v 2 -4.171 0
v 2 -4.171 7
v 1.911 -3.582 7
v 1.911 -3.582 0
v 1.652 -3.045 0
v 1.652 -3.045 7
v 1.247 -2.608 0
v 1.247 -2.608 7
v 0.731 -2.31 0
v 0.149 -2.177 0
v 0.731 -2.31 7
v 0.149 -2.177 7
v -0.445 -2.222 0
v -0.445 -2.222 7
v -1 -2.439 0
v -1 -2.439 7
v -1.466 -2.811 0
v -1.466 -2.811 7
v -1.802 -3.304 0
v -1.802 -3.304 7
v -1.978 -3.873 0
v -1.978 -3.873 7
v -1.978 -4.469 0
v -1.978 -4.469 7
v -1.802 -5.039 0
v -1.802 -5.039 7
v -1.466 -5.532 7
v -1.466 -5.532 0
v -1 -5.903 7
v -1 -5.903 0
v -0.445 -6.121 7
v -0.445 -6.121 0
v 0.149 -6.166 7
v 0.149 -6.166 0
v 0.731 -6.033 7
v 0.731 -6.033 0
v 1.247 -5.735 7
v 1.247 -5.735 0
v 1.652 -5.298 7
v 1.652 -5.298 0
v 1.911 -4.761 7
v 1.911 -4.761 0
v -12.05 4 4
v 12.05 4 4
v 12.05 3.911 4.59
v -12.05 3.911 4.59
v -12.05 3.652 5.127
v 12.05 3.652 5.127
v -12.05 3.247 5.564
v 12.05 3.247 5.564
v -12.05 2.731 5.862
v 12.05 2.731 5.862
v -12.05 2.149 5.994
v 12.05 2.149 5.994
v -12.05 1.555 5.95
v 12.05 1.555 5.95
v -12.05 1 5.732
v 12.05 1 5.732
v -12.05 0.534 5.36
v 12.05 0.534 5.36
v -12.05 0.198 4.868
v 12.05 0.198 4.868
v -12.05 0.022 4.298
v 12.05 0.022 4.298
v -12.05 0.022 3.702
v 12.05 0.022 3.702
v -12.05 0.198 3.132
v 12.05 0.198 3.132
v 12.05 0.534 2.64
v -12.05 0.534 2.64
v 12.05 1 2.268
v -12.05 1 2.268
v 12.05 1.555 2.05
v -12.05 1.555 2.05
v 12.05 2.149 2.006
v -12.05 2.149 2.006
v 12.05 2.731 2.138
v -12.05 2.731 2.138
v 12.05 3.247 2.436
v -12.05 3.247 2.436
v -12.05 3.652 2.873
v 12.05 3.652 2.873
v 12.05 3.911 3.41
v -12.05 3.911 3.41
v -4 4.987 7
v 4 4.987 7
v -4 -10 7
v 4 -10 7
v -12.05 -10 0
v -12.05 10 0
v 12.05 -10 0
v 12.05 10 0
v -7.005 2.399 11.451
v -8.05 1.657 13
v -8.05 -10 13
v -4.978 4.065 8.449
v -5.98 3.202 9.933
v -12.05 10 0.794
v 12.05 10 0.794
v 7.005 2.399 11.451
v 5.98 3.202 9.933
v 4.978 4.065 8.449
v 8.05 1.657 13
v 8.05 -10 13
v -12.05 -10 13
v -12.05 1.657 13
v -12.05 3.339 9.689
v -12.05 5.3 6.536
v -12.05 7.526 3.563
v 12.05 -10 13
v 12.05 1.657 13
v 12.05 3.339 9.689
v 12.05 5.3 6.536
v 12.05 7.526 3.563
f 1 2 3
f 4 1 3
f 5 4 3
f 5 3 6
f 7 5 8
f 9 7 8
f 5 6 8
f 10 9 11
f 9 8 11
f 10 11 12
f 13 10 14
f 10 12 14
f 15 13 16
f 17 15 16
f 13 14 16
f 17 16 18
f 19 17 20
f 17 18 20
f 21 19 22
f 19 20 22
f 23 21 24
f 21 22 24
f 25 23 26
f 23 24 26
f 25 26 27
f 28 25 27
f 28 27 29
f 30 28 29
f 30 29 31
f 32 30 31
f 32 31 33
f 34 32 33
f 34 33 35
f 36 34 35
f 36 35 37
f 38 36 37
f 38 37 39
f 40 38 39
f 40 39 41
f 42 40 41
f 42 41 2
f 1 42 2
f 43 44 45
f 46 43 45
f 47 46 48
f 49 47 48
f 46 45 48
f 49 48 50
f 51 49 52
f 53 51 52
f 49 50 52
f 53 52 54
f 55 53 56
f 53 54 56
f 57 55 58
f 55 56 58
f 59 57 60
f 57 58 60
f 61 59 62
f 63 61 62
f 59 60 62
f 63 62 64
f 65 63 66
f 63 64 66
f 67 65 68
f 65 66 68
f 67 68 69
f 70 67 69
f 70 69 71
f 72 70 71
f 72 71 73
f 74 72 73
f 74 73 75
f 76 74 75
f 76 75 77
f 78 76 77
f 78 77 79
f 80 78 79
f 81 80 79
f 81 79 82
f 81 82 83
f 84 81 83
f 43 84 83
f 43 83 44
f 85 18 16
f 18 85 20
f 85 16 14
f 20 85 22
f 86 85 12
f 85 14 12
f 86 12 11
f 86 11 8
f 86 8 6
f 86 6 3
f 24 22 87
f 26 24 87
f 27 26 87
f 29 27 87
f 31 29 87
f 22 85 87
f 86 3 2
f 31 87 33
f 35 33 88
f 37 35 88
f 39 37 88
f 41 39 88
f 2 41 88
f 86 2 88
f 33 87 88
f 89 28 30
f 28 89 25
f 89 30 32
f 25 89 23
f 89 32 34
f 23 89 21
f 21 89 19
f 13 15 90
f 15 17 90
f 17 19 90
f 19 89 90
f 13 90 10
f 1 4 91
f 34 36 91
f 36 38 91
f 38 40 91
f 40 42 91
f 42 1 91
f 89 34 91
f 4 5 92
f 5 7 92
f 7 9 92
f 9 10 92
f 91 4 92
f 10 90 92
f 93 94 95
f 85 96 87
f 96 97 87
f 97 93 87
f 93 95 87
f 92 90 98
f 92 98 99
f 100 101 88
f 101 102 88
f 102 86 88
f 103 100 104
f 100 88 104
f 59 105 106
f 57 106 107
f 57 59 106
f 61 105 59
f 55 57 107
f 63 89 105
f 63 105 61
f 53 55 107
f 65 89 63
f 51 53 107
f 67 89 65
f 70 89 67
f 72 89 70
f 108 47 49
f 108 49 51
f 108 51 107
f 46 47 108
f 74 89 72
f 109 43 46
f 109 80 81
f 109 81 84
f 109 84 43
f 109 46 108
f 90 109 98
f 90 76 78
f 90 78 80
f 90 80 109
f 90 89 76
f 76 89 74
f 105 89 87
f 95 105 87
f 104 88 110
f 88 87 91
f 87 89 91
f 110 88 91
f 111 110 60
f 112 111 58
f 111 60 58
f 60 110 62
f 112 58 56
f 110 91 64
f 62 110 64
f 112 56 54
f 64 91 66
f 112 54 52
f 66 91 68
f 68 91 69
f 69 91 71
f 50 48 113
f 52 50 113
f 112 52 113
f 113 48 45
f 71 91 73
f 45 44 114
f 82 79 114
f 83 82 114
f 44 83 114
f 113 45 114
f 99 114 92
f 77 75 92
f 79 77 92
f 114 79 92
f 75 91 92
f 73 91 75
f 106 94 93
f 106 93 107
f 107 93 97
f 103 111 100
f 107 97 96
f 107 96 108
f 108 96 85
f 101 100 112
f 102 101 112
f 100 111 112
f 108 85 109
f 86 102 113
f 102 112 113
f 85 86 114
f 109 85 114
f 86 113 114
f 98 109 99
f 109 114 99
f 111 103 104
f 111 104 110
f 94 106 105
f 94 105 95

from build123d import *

# Parameters (mm, degrees)
SKETCH_1_W          = 24.1
SKETCH_1_H          = 20
EXTRUDE_1_DEPTH     = 13
CUT_EXTRUDE_2_DEPTH = 30.151500819
SKETCH_4_R          = 2
CUT_EXTRUDE_3_DEPTH = 21.351965507
CUT_EXTRUDE_4_DEPTH = 27.724567349
SKETCH_6_R          = 2
CUT_EXTRUDE_5_DEPTH = 30.151500819


with BuildPart() as part:
    # 草图1 → 凸台-拉伸1 (new body)
    with BuildSketch(Plane.XY):
        Rectangle(SKETCH_1_W, SKETCH_1_H)
    extrude(amount=EXTRUDE_1_DEPTH)

    # 草图3 → 切除-拉伸2 (cut, through all)
    with BuildSketch(Plane(origin=(12.05, 0, 0), x_dir=(0, 0, -1), z_dir=(1, 0, 0))):
        with BuildLine():
            Line((-0.7940006, 10), (-13, 10))
            Line((-13, 10), (-13, 1.657184567))
            ThreePointArc((-13, 1.657184567), (-6.535745695, 5.300056859), (-0.7940006, 10))
        make_face()
    extrude(amount=-CUT_EXTRUDE_2_DEPTH, mode=Mode.SUBTRACT)

    # 草图4 → 切除-拉伸3 (cut, through all)
    with BuildSketch(Plane.XY.offset(13)):
        with Locations((0, -4.171407716)):
            Circle(SKETCH_4_R)
    extrude(amount=-CUT_EXTRUDE_3_DEPTH, mode=Mode.SUBTRACT)

    # 草图5 → 切除-拉伸4 (cut, through all)
    with BuildSketch(Plane.XZ.offset(10)):
        Polygon((0, 13), (-8.05, 13), (-4, 7), (0, 7), align=None)
        Polygon((8.05, 13), (0, 13), (0, 7), (4, 7), align=None)
    extrude(amount=-CUT_EXTRUDE_4_DEPTH, mode=Mode.SUBTRACT)

    # 草图6 → 切除-拉伸5 (cut, through all)
    with BuildSketch(Plane(origin=(12.05, 0, 0), x_dir=(0, 0, -1), z_dir=(1, 0, 0))):
        with Locations(Location((-4, 2, 0), (0, 0, 90))):
            Circle(SKETCH_6_R)
    extrude(amount=-CUT_EXTRUDE_5_DEPTH, mode=Mode.SUBTRACT)


solid = part.part
